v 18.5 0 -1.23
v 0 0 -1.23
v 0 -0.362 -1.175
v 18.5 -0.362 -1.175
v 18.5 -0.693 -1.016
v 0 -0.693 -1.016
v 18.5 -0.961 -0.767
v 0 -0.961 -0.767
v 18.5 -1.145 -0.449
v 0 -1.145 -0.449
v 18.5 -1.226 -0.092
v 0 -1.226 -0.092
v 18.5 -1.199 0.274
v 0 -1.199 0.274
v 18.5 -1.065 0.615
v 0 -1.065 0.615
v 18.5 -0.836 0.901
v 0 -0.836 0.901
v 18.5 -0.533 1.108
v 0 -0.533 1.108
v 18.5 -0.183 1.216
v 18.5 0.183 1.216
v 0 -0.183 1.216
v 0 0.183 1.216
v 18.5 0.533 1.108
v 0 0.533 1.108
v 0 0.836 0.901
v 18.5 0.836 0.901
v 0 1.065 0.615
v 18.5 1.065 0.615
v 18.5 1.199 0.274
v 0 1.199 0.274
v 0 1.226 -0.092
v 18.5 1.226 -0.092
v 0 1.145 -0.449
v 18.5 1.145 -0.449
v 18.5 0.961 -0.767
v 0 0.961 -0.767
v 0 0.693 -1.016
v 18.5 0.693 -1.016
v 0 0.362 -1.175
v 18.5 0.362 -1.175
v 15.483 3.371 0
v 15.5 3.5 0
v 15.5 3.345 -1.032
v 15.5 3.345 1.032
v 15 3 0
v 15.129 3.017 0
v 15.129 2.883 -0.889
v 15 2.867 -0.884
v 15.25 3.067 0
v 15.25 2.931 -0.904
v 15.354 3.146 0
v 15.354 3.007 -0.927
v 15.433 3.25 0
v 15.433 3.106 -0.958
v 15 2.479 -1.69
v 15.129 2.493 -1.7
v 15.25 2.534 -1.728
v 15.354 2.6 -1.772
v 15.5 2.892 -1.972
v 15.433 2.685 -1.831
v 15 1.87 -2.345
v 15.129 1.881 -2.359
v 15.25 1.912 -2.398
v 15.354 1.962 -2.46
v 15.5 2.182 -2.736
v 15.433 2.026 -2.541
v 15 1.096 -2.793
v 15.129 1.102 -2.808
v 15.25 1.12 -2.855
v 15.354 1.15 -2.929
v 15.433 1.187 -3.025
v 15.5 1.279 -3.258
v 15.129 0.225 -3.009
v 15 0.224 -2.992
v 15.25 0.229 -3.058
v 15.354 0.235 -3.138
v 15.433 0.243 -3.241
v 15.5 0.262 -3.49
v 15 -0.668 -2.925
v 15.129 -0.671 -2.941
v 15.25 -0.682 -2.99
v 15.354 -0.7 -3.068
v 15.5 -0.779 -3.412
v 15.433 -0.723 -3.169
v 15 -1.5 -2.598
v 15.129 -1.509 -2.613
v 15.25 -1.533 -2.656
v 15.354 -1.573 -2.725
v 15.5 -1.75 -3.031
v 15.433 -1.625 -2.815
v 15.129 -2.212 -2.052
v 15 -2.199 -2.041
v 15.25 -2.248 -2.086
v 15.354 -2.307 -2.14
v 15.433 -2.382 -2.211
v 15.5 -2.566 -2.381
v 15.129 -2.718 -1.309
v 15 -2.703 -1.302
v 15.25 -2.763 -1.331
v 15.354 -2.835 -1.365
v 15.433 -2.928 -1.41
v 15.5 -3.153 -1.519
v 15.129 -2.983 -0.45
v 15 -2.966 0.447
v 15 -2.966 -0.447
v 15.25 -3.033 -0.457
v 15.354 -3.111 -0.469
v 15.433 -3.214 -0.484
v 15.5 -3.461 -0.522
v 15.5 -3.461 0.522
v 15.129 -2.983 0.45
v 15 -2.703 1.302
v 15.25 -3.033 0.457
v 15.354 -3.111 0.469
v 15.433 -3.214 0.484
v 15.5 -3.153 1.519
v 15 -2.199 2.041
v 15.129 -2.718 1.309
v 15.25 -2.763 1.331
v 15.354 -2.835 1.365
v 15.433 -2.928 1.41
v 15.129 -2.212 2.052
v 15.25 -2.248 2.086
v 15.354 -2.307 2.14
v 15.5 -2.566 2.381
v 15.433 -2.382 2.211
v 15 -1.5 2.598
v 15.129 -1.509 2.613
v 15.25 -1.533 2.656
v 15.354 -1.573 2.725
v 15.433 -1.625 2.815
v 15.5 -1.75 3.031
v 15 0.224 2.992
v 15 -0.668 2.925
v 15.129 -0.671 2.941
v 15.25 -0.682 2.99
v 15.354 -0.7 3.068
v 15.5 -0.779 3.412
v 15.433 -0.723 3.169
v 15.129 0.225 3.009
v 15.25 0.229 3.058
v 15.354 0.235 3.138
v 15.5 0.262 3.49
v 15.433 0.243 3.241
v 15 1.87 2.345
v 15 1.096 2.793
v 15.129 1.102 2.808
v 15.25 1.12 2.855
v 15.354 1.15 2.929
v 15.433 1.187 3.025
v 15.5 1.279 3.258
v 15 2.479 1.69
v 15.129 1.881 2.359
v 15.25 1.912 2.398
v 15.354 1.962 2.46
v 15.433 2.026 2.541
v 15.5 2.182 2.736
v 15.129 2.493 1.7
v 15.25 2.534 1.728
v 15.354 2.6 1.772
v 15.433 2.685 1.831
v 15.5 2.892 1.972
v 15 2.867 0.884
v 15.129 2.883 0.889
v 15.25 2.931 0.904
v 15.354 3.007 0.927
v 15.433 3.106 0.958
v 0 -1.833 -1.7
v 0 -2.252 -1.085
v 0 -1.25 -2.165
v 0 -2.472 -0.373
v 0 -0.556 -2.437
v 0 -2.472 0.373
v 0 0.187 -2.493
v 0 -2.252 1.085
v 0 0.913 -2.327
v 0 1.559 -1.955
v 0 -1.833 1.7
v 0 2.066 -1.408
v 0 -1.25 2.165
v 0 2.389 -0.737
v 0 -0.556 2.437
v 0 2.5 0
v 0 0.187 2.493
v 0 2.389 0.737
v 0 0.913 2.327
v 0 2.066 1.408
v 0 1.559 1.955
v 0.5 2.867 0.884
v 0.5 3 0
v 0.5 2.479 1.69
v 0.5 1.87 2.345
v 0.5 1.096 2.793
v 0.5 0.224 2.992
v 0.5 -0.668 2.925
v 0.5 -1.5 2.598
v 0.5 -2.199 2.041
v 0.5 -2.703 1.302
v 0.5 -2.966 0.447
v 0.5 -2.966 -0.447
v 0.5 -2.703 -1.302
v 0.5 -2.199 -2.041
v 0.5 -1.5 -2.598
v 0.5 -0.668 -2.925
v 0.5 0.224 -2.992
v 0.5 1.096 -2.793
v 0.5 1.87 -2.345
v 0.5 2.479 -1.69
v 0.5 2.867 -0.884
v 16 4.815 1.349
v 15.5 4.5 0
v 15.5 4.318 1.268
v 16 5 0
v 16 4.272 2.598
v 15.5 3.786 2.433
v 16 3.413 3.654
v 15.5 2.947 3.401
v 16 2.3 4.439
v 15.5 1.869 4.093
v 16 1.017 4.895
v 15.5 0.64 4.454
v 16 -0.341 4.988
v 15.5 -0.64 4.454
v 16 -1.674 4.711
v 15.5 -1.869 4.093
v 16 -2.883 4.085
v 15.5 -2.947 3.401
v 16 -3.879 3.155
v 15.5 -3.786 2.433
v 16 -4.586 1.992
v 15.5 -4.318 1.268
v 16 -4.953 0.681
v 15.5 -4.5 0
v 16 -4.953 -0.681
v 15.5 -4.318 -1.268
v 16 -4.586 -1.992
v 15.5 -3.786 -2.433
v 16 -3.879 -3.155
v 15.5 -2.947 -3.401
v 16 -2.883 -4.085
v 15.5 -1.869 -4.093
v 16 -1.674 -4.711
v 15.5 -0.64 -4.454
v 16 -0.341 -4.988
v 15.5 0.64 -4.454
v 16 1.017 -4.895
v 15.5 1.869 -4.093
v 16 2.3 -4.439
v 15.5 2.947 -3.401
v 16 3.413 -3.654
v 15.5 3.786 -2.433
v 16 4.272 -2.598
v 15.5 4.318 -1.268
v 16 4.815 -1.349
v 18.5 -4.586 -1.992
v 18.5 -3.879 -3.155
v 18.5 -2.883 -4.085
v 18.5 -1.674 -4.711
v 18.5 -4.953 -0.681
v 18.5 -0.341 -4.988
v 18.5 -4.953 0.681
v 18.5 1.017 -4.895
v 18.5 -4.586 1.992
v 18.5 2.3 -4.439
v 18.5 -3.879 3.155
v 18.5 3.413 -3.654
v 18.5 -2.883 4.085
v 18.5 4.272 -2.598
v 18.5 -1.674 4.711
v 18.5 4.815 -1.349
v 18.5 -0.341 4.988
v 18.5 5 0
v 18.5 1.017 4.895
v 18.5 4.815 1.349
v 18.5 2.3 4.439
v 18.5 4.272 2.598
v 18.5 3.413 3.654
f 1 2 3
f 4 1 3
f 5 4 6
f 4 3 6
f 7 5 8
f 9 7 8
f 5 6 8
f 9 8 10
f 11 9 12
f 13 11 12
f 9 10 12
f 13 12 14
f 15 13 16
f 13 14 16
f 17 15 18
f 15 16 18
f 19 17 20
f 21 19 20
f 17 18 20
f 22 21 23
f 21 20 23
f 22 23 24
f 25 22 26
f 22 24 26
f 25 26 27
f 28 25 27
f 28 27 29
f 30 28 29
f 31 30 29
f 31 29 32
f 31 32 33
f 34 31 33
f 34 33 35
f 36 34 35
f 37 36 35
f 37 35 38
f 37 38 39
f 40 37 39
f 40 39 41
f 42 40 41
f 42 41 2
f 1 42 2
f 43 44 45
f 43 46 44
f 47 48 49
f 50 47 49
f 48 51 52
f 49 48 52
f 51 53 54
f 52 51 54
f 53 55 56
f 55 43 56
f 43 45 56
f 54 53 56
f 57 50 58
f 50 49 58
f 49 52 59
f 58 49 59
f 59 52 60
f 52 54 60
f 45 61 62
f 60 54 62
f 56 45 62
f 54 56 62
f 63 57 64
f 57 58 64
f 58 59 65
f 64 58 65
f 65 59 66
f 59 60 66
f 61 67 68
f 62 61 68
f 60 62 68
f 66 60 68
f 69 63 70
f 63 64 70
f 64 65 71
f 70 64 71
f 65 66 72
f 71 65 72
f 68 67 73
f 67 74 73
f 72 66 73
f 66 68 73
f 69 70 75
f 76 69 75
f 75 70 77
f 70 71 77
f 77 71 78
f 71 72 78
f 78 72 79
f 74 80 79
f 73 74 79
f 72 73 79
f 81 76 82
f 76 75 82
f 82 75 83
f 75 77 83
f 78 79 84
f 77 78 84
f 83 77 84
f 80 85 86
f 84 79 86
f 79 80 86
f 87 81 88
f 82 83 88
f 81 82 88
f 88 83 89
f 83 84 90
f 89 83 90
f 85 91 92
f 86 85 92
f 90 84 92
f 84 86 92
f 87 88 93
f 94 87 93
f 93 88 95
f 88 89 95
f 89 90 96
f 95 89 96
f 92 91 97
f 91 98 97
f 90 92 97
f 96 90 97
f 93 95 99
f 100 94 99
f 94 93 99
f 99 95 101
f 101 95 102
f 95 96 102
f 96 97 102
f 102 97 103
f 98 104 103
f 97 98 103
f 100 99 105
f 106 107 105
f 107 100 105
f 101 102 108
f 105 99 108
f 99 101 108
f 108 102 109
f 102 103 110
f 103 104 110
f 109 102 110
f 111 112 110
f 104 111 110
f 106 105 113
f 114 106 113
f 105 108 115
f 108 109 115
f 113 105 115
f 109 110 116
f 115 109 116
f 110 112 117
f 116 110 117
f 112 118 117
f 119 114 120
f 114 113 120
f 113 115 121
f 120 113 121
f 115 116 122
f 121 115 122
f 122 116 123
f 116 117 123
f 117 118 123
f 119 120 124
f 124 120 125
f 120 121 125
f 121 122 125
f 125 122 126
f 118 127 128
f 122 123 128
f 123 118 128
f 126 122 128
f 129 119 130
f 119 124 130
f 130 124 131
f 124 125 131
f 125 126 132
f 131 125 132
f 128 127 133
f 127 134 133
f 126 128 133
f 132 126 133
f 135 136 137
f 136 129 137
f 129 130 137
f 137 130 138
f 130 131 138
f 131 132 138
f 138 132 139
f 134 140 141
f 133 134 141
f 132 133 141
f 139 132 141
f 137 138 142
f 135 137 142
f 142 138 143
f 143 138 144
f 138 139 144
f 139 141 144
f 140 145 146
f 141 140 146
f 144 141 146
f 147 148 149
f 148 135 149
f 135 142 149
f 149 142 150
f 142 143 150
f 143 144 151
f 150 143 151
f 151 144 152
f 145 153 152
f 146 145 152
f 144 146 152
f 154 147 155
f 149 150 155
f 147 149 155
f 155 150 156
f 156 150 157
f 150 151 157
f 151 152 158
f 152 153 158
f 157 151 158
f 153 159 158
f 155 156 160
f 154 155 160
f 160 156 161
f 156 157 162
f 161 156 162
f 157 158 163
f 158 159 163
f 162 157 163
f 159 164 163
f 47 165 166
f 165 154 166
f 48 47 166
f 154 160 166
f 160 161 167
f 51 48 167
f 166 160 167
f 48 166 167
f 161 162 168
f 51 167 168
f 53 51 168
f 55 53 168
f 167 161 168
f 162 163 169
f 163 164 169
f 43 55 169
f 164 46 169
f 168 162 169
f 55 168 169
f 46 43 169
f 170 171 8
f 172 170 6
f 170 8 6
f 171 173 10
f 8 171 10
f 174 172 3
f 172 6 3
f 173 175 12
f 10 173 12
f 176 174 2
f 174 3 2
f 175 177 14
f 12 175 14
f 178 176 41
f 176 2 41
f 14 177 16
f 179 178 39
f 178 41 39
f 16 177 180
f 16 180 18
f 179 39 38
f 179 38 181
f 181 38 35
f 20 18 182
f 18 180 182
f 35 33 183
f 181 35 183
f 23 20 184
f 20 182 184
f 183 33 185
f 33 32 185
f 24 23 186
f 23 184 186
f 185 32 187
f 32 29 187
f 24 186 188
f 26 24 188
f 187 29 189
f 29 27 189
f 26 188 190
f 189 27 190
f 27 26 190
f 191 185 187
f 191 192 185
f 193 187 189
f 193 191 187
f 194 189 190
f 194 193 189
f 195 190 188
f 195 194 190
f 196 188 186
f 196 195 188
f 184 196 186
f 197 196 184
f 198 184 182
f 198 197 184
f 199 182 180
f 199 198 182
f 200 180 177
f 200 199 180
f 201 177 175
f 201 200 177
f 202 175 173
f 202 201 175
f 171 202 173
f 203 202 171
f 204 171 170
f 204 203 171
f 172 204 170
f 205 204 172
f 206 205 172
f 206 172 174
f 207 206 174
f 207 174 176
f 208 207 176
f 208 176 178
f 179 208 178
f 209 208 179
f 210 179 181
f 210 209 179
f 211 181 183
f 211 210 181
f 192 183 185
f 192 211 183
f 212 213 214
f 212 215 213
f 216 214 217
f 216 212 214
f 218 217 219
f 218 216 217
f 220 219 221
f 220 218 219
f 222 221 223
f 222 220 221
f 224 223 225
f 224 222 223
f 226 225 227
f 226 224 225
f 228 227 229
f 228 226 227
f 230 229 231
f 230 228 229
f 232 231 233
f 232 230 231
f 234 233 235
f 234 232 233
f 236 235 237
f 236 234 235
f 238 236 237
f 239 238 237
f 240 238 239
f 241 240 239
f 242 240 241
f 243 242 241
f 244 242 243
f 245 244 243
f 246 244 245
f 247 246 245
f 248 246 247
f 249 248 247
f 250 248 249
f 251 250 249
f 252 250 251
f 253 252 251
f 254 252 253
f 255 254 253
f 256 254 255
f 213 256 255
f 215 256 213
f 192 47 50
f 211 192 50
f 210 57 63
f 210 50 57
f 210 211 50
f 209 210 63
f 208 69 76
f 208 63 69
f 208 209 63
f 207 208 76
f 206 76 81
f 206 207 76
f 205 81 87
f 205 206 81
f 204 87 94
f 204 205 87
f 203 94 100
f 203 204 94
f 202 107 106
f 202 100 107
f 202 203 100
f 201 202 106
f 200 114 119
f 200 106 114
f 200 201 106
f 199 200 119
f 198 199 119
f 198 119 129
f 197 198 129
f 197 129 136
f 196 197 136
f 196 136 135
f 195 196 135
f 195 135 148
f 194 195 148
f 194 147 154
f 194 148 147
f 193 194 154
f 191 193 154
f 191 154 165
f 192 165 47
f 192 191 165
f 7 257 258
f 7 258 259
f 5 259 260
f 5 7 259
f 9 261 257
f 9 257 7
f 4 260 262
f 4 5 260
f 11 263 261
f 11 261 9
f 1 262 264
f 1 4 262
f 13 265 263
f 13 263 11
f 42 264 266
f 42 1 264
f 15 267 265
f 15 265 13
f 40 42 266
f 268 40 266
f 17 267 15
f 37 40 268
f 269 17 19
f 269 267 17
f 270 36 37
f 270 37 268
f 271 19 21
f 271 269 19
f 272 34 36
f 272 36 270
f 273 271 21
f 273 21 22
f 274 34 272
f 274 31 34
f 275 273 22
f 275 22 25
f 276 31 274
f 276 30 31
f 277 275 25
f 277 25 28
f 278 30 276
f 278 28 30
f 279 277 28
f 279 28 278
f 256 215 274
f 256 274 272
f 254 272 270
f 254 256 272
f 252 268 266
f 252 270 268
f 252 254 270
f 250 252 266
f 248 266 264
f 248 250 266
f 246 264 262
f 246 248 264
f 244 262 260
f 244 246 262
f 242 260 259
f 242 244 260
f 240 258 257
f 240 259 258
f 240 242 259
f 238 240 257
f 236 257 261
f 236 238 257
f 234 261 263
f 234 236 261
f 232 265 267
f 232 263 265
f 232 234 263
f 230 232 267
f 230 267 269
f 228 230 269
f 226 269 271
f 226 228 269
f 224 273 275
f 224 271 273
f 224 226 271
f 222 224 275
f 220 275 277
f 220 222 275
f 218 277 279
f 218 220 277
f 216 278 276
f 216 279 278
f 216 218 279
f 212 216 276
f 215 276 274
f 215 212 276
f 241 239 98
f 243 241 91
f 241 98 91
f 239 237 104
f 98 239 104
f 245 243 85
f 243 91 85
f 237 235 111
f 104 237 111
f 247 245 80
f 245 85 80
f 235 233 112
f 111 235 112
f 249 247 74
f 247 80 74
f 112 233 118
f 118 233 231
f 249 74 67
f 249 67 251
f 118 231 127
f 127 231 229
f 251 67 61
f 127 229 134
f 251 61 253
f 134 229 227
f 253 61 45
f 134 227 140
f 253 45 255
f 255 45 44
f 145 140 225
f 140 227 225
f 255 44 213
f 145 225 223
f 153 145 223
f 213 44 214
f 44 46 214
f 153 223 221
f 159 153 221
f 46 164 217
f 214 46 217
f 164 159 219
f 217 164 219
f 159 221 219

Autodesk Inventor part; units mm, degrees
ref_plane "YZ Plane" through (0, 0, 0) normal (1, 0, 0) x (0, 1, 0)
ref_plane "XZ Plane" through (0, 0, 0) normal (0, 1, 0) x (-1, 0, 0)
ref_plane "XY Plane" through (0, 0, 0) normal (0, 0, 1) x (1, 0, 0)
sketch "Sketch1" plane through (0, 0, 0) normal (0, 0, 1) x (1, 0, 0)
  line L0 (0, 0) -> (15.5, 0)
  line L1 (15.5, 0) -> (15.5, 3)
  line L2 (15.5, 3) -> (0, 3)
  line L3 (0, 3) -> (0, 0)
  line L4 (15.5, 0) -> (18.5, 0)
  line L5 (18.5, 0) -> (18.5, 5)
  line L6 (18.5, 5) -> (15.5, 5)
  line L7 (15.5, 5) -> (15.5, 0)
  line L8 (0, 0) -> (18.5, 0)
  dimension "d0" = 5
  dimension "d1" = 3
  dimension "d2" = 15.5
  dimension "d3" = 3
revolve "Revolution1" add sketch "Sketch1" angle 360 about axis through (15.5, 0, 0) along (1, 0, 0)
fillet "Fillet1" radius 0.5 1 edges at (15.5, -3, 0)
chamfer "Chamfer1" distance 0.5 angle 45 2 edges at (0, -3, 0) (15.5, -5, 0)
sketch "Sketch2" plane through (18.5, 0, 0) normal (-1, 0, 0) x (0, 0, 1)
  circle A0 centre (0, 0) radius 3 projected
  point P0 (0, 0)
hole "Hole1" at (18.5, 0, 0) direction (-1, 0, 0) diameter 2.459 end through all thread size "M3x0.5" class "6H" standard "ANSI Metric M Profile"
properties part number "Pancake_Lever Mount Piece" material "Aluminum 6061"
